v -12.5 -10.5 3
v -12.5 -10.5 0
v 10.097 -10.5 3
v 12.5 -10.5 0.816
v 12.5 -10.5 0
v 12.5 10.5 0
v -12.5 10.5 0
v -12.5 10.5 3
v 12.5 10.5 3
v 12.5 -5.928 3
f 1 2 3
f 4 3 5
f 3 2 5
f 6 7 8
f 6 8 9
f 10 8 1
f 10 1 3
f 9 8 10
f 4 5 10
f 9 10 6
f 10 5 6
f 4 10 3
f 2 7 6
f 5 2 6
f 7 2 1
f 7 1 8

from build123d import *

# Parameters (mm, degrees)
SKETCH_1_W               = 25
SKETCH_1_H               = 21
EXTRUDE_1_DEPTH          = 3
CUT_EXTRUDE_3_DEPTH      = 19.00065745
CUT_EXTRUDE_3_DEPTH_BACK = 8.205289813


with BuildPart() as part:
    # Эскиз1 → Вытянуть1 (new body)
    with BuildSketch(Plane.XY):
        Rectangle(SKETCH_1_W, SKETCH_1_H)
    extrude(amount=EXTRUDE_1_DEPTH)

    # Эскиз5 → Вырез-Вытянуть3 (cut, two sides)
    with BuildSketch(Plane(origin=(2.320978506, -2.004481437, -3.066738831), x_dir=(0.83223631, 0.144886823, 0.535154681), z_dir=(-0.535154681, 0.462179043, 0.707106781))) as cut_extrude_3_sk:
        Polygon((41.380676695, 44.610682214), (11.149544103, -4.761591786), (8.487106278, -9.109778524), (-21.744026314, -58.482052523), (77.000521684, -118.944317707), (140.125224694, -15.85158297), align=None)
    extrude(amount=CUT_EXTRUDE_3_DEPTH, mode=Mode.SUBTRACT)
    extrude(cut_extrude_3_sk.sketch, amount=-CUT_EXTRUDE_3_DEPTH_BACK, mode=Mode.SUBTRACT)


solid = part.part
